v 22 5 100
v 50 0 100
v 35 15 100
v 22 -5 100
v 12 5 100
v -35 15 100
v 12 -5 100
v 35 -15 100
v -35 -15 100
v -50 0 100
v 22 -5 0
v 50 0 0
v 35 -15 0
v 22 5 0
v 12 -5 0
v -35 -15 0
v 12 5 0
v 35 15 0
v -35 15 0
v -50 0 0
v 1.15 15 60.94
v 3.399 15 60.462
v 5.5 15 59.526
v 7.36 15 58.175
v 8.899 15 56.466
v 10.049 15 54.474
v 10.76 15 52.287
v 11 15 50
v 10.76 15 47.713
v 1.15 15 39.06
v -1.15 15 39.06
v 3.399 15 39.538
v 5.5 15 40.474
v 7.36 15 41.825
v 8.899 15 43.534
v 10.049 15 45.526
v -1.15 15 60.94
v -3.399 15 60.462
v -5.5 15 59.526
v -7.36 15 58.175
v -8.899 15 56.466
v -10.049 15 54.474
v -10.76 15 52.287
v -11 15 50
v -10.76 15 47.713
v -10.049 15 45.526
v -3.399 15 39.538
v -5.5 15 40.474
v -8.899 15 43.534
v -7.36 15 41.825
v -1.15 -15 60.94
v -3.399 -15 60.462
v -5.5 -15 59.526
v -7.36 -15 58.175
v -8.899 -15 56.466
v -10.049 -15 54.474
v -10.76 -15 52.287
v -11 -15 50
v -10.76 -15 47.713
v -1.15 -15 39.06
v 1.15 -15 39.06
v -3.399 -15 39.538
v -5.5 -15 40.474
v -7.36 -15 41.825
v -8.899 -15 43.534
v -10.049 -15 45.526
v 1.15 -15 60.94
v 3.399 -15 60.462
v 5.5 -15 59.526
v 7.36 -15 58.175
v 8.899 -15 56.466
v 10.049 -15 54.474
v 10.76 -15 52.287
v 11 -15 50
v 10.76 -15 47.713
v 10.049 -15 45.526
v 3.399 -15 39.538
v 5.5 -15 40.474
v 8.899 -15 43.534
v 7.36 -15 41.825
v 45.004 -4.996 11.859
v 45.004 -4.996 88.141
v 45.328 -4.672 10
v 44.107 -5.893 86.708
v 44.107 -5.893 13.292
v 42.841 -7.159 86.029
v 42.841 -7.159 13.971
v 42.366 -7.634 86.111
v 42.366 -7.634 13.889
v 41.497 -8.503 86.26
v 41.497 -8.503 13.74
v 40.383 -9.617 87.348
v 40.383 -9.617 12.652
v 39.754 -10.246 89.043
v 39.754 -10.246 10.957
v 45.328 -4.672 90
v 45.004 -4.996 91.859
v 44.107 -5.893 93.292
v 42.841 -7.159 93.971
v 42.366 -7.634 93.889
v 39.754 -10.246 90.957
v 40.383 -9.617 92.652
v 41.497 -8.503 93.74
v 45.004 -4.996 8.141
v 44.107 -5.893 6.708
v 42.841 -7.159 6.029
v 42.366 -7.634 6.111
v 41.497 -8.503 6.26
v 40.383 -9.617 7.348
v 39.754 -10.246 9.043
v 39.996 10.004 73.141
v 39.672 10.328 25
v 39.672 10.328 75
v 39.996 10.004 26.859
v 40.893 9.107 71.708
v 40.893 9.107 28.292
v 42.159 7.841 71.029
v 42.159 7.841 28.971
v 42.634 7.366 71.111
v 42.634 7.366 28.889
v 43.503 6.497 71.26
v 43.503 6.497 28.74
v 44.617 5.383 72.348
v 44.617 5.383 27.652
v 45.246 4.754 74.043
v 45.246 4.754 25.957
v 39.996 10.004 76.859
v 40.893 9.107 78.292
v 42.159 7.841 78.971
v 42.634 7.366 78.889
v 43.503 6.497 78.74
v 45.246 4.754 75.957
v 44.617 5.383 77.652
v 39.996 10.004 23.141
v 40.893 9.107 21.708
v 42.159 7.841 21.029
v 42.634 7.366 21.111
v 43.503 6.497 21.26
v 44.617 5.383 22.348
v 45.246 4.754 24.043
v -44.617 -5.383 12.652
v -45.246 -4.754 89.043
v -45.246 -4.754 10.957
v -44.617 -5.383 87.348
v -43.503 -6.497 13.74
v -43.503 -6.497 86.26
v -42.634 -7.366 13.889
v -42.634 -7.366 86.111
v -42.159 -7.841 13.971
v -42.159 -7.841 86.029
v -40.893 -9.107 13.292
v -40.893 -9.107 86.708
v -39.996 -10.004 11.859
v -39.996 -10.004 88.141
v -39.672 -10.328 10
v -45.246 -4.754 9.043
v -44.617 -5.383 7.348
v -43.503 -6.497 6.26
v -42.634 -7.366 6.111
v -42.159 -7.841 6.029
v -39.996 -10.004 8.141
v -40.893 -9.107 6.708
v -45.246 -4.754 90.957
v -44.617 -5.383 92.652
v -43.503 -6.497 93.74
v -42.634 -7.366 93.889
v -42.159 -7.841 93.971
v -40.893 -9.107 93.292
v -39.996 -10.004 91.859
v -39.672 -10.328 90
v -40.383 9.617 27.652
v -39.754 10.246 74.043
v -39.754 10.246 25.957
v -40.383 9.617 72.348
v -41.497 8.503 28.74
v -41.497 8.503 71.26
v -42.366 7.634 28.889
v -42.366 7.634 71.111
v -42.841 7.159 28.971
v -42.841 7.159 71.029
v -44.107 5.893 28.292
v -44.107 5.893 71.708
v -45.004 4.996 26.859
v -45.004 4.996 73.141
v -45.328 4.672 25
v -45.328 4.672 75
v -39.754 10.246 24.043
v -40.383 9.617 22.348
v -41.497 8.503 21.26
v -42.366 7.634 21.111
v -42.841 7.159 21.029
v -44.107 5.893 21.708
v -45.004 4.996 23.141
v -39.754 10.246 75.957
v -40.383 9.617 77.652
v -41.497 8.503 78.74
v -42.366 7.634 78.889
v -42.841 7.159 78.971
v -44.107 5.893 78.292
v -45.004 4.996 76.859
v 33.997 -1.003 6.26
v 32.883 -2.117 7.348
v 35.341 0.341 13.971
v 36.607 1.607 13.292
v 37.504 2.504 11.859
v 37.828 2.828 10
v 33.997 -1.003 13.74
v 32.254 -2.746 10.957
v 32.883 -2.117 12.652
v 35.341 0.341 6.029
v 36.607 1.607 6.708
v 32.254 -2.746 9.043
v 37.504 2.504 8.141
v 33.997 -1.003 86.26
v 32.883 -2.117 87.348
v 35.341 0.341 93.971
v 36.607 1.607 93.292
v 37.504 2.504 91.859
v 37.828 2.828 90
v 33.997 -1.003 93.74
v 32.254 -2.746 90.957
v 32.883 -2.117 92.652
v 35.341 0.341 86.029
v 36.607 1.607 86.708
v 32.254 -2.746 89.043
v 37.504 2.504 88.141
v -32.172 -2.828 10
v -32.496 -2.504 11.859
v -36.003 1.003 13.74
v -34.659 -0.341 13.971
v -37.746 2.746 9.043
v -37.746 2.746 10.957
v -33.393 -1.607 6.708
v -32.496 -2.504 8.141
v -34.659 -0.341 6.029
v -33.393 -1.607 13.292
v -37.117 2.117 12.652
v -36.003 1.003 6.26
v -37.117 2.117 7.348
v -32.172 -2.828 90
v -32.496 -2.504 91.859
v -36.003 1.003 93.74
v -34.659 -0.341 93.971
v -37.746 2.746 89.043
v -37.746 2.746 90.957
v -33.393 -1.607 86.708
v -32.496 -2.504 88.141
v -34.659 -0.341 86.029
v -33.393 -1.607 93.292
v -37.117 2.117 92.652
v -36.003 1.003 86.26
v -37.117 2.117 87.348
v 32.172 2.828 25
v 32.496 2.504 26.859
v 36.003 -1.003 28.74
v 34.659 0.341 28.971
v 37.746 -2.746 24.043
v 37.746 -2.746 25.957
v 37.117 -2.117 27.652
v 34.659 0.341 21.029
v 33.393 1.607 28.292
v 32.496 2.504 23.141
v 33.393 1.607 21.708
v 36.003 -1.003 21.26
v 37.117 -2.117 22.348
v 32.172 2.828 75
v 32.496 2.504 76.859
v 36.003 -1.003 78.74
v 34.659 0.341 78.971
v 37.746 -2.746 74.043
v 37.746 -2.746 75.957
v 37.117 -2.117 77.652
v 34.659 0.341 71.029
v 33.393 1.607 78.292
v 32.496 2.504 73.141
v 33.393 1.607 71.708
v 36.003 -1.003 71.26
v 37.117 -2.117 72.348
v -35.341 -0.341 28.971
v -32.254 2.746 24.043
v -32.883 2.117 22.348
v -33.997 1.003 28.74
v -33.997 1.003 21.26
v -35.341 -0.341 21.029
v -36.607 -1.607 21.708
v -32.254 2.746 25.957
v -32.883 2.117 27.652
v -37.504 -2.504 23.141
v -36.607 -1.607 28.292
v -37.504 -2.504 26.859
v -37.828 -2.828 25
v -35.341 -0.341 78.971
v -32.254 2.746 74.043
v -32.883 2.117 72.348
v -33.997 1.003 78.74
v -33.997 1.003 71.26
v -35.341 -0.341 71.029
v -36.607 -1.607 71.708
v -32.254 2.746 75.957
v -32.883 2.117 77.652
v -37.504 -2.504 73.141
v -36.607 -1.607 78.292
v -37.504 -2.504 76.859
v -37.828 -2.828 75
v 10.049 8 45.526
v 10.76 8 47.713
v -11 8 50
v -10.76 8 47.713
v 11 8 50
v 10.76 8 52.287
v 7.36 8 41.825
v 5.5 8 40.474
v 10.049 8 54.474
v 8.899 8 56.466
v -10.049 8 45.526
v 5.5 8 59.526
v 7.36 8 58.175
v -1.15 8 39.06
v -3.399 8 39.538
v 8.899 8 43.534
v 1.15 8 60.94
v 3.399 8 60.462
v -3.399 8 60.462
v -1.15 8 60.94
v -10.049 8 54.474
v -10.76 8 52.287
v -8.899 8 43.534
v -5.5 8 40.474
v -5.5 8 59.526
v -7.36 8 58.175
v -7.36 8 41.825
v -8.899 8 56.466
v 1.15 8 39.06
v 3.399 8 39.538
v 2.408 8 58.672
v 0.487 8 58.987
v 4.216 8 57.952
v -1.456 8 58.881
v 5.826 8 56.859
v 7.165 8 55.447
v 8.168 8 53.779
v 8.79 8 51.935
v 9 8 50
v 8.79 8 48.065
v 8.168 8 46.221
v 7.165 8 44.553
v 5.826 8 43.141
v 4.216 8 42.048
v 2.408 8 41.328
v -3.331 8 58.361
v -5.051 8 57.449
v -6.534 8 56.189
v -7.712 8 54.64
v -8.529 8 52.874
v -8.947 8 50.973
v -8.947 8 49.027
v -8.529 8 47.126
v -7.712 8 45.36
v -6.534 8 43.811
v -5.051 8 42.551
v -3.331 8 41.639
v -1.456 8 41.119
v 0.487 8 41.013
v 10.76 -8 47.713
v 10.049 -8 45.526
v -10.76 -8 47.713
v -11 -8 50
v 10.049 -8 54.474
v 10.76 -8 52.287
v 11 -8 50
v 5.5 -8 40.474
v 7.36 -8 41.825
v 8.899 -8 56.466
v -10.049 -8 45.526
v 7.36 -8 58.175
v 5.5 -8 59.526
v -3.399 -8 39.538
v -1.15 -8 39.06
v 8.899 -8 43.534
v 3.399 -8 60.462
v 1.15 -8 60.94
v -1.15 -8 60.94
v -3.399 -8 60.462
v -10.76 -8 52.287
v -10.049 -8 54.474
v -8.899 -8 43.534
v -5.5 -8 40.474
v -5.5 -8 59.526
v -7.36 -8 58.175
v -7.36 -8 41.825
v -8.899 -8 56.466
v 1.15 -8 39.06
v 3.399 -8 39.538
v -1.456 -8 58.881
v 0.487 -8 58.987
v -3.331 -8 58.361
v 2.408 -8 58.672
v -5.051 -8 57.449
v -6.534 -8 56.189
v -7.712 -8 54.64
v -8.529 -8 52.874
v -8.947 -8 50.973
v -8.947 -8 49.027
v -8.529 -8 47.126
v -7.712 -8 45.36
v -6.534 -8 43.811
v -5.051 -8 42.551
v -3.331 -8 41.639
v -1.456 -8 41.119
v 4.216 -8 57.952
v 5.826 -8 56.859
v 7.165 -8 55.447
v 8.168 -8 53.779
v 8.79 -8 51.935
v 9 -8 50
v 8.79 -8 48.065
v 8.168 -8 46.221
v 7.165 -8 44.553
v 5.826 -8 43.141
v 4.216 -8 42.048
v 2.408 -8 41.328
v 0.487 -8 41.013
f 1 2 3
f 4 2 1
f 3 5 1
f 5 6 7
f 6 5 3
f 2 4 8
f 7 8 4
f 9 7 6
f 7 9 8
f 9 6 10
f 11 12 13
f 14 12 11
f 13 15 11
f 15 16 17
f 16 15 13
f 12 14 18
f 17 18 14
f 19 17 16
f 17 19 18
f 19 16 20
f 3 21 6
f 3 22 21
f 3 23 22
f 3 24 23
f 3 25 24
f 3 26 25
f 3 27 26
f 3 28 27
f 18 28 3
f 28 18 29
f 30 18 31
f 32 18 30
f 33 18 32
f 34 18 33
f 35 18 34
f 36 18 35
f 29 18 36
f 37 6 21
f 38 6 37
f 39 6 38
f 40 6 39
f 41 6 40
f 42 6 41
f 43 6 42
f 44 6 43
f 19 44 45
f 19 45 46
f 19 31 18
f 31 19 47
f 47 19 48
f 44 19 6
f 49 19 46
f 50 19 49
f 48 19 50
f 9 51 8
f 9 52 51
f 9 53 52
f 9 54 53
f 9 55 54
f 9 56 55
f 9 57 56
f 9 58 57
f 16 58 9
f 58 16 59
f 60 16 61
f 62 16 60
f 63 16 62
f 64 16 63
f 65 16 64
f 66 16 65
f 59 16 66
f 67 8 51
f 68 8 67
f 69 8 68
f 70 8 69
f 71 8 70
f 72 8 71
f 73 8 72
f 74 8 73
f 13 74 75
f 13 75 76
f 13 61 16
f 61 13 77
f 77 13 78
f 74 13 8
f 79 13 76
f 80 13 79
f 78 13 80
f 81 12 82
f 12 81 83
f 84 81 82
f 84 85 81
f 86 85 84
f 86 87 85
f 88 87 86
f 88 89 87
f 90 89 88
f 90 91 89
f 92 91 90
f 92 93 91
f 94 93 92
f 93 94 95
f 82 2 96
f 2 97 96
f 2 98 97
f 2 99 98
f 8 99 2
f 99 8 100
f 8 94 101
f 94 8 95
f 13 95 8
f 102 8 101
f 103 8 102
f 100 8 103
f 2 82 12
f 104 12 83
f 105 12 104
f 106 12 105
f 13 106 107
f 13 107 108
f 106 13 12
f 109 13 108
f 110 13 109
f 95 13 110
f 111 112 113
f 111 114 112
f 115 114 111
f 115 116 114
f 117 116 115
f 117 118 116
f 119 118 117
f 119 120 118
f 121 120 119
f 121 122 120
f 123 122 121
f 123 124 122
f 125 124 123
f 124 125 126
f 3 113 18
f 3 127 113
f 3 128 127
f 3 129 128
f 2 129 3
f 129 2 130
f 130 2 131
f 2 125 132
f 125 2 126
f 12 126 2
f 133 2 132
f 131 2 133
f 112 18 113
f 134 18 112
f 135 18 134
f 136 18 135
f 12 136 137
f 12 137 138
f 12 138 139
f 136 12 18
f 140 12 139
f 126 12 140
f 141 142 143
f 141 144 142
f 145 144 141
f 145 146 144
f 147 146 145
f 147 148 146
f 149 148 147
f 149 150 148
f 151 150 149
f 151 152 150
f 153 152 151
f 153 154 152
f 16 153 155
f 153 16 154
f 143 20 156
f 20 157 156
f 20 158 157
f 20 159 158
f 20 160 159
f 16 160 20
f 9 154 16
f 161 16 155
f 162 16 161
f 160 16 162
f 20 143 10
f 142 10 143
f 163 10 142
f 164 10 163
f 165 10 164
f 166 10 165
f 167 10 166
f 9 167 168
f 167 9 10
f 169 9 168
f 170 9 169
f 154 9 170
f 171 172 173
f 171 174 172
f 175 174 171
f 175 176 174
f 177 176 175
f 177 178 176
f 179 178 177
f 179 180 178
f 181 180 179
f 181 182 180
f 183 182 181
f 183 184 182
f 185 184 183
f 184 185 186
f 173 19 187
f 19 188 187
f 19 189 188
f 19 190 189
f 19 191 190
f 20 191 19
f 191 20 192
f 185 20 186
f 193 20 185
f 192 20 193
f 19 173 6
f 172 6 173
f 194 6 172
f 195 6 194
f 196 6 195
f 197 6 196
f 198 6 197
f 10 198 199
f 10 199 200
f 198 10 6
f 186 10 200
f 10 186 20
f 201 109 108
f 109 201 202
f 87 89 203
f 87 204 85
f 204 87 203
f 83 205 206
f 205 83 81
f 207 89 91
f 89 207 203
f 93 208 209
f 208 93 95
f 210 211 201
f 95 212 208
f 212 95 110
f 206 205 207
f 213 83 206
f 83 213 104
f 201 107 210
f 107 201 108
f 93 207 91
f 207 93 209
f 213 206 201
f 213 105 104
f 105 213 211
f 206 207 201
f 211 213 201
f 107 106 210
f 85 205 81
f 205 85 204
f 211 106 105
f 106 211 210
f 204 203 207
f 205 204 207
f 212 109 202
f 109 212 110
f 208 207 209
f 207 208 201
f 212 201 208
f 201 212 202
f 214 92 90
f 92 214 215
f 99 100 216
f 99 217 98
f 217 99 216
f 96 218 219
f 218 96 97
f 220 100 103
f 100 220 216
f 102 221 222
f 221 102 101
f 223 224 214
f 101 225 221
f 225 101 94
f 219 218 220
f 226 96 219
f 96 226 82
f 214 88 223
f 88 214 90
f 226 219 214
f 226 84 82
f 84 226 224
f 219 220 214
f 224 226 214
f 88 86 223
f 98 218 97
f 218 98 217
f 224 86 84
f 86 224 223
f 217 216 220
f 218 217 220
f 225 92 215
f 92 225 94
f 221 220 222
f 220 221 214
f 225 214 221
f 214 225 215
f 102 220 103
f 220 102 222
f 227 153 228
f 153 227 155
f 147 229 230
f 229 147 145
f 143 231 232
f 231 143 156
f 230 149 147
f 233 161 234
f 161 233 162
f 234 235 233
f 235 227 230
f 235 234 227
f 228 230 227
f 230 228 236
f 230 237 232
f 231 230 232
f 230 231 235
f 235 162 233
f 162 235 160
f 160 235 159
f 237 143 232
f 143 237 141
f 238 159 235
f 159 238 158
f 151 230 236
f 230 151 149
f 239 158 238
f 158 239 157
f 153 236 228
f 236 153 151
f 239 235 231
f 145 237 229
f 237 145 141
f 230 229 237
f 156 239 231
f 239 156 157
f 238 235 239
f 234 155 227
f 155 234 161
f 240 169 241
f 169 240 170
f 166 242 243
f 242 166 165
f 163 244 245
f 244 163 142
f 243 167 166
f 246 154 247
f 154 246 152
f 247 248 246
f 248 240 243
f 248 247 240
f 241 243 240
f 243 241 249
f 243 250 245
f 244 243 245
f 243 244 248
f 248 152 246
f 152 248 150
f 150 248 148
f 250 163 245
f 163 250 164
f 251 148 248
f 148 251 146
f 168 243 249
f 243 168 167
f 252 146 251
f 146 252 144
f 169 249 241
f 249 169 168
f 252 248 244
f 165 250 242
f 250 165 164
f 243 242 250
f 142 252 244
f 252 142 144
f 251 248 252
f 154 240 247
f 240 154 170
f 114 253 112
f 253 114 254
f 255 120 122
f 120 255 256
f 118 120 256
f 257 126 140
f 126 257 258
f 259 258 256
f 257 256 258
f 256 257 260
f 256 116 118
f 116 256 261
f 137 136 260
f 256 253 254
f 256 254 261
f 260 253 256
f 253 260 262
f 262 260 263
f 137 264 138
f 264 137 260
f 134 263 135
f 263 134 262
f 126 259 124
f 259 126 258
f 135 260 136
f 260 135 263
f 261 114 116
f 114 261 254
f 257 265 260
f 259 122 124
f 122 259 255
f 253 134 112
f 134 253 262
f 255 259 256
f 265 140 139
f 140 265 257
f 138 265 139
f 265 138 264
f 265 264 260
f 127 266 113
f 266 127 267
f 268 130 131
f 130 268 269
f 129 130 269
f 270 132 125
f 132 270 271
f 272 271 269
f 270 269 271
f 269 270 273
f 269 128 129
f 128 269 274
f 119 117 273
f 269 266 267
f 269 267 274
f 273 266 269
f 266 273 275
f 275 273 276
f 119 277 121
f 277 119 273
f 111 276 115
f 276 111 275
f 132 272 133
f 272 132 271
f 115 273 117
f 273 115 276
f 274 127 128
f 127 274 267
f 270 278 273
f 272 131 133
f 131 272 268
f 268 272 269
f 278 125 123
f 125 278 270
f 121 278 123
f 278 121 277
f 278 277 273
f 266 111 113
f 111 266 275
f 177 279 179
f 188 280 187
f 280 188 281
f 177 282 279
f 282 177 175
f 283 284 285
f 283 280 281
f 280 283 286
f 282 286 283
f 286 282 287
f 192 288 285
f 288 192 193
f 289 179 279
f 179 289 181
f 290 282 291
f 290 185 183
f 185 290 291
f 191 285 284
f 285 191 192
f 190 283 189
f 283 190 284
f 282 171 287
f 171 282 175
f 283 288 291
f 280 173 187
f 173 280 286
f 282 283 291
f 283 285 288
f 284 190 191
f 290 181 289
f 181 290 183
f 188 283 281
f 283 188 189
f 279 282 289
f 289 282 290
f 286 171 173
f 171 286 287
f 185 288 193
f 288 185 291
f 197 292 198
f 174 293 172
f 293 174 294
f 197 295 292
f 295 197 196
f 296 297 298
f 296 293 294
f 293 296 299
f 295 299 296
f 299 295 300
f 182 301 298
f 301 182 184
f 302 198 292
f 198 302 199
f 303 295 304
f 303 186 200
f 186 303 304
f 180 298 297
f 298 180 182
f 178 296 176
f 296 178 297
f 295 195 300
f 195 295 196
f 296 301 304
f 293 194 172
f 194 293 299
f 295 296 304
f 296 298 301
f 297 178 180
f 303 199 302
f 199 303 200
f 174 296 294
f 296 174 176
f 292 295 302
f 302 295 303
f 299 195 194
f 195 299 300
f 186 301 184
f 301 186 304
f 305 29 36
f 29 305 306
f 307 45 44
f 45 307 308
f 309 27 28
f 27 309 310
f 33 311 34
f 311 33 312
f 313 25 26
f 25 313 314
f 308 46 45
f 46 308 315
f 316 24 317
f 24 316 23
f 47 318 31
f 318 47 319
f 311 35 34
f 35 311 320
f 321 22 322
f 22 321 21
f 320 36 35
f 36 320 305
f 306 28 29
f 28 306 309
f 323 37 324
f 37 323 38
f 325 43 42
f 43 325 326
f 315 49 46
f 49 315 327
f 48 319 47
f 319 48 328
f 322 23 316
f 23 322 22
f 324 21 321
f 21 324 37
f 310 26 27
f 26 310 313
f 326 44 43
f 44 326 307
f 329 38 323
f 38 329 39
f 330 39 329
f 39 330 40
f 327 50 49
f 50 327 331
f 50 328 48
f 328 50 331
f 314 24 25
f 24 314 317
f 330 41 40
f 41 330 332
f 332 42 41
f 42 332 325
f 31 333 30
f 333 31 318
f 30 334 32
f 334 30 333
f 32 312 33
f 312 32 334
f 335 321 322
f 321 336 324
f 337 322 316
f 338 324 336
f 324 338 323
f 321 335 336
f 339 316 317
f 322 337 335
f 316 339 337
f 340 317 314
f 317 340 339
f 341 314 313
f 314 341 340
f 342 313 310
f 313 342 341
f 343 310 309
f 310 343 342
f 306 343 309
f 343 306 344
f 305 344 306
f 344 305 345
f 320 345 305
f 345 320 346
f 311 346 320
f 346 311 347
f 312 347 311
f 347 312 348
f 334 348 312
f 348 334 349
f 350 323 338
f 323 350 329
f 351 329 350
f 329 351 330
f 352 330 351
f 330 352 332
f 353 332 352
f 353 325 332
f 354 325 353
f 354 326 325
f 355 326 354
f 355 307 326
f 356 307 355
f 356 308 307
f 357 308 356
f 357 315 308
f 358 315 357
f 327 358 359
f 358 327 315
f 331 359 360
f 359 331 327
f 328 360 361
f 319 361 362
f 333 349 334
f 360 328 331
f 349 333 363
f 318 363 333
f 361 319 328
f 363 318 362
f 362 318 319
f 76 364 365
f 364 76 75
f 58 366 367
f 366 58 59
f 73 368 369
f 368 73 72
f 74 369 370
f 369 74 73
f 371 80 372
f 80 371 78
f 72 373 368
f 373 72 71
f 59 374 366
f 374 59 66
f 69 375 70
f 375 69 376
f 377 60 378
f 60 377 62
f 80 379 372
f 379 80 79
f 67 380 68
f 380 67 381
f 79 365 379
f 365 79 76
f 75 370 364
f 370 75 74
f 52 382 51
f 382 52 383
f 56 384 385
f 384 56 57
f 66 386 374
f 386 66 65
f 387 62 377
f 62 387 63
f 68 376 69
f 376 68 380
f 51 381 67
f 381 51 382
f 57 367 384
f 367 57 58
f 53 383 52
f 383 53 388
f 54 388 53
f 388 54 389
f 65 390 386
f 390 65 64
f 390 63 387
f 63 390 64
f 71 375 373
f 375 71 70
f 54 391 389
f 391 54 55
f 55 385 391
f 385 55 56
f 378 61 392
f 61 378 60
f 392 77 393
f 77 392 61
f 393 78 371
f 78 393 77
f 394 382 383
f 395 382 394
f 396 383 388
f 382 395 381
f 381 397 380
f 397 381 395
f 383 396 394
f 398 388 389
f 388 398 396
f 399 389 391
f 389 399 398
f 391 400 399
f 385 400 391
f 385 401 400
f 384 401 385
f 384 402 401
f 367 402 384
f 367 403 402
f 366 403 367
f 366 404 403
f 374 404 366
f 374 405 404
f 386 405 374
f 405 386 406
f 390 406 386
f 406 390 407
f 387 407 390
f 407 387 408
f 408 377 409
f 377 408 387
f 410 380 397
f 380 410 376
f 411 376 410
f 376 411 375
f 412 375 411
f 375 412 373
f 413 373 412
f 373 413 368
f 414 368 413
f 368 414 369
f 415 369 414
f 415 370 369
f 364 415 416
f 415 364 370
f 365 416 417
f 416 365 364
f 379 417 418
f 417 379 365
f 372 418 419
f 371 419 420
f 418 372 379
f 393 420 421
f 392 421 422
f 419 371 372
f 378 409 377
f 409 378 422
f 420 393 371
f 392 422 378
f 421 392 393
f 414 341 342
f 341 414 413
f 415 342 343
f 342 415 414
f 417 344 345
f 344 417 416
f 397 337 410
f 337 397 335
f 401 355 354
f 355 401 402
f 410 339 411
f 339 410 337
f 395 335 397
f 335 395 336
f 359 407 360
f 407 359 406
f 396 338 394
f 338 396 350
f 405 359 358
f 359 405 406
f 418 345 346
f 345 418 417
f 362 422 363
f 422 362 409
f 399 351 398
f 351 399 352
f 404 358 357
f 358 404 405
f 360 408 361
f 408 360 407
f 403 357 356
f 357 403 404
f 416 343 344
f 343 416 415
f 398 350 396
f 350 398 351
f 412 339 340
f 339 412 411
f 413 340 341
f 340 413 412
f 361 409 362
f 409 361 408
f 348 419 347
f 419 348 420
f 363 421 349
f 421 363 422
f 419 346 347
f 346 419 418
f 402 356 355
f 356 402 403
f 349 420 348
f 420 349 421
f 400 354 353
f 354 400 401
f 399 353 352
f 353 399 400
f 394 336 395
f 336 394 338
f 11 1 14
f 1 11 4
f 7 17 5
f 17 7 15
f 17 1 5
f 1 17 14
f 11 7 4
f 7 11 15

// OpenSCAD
screwDiam = 8;
dollyHeigth = 100;
dollyWidth = 30;

beltWidth = 4;
beltHeigth = 1;

module mainbody() {
	union(){
		translate([-35, -15,0]) cube([70,30,dollyHeigth]);
		translate([35,0,0]) rotate([0,0,45]) translate([-sqrt(450)/2,-sqrt((dollyWidth*dollyWidth)/2)/2,0]) cube([sqrt((dollyWidth*dollyWidth)/2),sqrt((dollyWidth*dollyWidth)/2),dollyHeigth]);
		translate([-35,0,0]) rotate([0,0,45]) translate([-sqrt(450)/2,-sqrt((dollyWidth*dollyWidth)/2)/2,0]) cube([sqrt((dollyWidth*dollyWidth)/2),sqrt((dollyWidth*dollyWidth)/2),dollyHeigth]);
	}
}

module axesholes() {
	translate([35,0,10])rotate([90,0,45])cylinder(h=30,r=screwDiam/2);
	translate([35,0,dollyHeigth-10])rotate([90,0,45])cylinder(h=30,r=screwDiam/2);
	translate([-35,0,10])rotate([90,0,-45])cylinder(h=30,r=screwDiam/2);
	translate([-35,0,dollyHeigth-10])rotate([90,0,-45])cylinder(h=30,r=screwDiam/2);

	translate([35,0,25])rotate([90,0,135])cylinder(h=30,r=screwDiam/2);
	translate([35,0,dollyHeigth-25])rotate([90,0,135])cylinder(h=30,r=screwDiam/2);
	translate([-35,0,25])rotate([90,0,-135])cylinder(h=30,r=screwDiam/2);
	translate([-35,0,dollyHeigth-25])rotate([90,0,-135])cylinder(h=30,r=screwDiam/2);
}

module ballBearing() {
	translate([0,3.5,0])rotate([90,0,0])cylinder(r=11,h=7);
}

module centralMount() {
	translate([0,dollyWidth/2-3.5,dollyHeigth/2])ballBearing();
	translate([0,-(dollyWidth/2-3.5),dollyHeigth/2])ballBearing();
	translate([0,15,dollyHeigth/2])rotate([90,0,0])cylinder(r=9,h=30);
}

module beltSlot() {
	translate([12,-5,0])cube([10,10,dollyHeigth]);
}

module complete() {
	difference() {
		mainbody();
		axesholes();
		centralMount();
		beltSlot();
	}
}

complete();
